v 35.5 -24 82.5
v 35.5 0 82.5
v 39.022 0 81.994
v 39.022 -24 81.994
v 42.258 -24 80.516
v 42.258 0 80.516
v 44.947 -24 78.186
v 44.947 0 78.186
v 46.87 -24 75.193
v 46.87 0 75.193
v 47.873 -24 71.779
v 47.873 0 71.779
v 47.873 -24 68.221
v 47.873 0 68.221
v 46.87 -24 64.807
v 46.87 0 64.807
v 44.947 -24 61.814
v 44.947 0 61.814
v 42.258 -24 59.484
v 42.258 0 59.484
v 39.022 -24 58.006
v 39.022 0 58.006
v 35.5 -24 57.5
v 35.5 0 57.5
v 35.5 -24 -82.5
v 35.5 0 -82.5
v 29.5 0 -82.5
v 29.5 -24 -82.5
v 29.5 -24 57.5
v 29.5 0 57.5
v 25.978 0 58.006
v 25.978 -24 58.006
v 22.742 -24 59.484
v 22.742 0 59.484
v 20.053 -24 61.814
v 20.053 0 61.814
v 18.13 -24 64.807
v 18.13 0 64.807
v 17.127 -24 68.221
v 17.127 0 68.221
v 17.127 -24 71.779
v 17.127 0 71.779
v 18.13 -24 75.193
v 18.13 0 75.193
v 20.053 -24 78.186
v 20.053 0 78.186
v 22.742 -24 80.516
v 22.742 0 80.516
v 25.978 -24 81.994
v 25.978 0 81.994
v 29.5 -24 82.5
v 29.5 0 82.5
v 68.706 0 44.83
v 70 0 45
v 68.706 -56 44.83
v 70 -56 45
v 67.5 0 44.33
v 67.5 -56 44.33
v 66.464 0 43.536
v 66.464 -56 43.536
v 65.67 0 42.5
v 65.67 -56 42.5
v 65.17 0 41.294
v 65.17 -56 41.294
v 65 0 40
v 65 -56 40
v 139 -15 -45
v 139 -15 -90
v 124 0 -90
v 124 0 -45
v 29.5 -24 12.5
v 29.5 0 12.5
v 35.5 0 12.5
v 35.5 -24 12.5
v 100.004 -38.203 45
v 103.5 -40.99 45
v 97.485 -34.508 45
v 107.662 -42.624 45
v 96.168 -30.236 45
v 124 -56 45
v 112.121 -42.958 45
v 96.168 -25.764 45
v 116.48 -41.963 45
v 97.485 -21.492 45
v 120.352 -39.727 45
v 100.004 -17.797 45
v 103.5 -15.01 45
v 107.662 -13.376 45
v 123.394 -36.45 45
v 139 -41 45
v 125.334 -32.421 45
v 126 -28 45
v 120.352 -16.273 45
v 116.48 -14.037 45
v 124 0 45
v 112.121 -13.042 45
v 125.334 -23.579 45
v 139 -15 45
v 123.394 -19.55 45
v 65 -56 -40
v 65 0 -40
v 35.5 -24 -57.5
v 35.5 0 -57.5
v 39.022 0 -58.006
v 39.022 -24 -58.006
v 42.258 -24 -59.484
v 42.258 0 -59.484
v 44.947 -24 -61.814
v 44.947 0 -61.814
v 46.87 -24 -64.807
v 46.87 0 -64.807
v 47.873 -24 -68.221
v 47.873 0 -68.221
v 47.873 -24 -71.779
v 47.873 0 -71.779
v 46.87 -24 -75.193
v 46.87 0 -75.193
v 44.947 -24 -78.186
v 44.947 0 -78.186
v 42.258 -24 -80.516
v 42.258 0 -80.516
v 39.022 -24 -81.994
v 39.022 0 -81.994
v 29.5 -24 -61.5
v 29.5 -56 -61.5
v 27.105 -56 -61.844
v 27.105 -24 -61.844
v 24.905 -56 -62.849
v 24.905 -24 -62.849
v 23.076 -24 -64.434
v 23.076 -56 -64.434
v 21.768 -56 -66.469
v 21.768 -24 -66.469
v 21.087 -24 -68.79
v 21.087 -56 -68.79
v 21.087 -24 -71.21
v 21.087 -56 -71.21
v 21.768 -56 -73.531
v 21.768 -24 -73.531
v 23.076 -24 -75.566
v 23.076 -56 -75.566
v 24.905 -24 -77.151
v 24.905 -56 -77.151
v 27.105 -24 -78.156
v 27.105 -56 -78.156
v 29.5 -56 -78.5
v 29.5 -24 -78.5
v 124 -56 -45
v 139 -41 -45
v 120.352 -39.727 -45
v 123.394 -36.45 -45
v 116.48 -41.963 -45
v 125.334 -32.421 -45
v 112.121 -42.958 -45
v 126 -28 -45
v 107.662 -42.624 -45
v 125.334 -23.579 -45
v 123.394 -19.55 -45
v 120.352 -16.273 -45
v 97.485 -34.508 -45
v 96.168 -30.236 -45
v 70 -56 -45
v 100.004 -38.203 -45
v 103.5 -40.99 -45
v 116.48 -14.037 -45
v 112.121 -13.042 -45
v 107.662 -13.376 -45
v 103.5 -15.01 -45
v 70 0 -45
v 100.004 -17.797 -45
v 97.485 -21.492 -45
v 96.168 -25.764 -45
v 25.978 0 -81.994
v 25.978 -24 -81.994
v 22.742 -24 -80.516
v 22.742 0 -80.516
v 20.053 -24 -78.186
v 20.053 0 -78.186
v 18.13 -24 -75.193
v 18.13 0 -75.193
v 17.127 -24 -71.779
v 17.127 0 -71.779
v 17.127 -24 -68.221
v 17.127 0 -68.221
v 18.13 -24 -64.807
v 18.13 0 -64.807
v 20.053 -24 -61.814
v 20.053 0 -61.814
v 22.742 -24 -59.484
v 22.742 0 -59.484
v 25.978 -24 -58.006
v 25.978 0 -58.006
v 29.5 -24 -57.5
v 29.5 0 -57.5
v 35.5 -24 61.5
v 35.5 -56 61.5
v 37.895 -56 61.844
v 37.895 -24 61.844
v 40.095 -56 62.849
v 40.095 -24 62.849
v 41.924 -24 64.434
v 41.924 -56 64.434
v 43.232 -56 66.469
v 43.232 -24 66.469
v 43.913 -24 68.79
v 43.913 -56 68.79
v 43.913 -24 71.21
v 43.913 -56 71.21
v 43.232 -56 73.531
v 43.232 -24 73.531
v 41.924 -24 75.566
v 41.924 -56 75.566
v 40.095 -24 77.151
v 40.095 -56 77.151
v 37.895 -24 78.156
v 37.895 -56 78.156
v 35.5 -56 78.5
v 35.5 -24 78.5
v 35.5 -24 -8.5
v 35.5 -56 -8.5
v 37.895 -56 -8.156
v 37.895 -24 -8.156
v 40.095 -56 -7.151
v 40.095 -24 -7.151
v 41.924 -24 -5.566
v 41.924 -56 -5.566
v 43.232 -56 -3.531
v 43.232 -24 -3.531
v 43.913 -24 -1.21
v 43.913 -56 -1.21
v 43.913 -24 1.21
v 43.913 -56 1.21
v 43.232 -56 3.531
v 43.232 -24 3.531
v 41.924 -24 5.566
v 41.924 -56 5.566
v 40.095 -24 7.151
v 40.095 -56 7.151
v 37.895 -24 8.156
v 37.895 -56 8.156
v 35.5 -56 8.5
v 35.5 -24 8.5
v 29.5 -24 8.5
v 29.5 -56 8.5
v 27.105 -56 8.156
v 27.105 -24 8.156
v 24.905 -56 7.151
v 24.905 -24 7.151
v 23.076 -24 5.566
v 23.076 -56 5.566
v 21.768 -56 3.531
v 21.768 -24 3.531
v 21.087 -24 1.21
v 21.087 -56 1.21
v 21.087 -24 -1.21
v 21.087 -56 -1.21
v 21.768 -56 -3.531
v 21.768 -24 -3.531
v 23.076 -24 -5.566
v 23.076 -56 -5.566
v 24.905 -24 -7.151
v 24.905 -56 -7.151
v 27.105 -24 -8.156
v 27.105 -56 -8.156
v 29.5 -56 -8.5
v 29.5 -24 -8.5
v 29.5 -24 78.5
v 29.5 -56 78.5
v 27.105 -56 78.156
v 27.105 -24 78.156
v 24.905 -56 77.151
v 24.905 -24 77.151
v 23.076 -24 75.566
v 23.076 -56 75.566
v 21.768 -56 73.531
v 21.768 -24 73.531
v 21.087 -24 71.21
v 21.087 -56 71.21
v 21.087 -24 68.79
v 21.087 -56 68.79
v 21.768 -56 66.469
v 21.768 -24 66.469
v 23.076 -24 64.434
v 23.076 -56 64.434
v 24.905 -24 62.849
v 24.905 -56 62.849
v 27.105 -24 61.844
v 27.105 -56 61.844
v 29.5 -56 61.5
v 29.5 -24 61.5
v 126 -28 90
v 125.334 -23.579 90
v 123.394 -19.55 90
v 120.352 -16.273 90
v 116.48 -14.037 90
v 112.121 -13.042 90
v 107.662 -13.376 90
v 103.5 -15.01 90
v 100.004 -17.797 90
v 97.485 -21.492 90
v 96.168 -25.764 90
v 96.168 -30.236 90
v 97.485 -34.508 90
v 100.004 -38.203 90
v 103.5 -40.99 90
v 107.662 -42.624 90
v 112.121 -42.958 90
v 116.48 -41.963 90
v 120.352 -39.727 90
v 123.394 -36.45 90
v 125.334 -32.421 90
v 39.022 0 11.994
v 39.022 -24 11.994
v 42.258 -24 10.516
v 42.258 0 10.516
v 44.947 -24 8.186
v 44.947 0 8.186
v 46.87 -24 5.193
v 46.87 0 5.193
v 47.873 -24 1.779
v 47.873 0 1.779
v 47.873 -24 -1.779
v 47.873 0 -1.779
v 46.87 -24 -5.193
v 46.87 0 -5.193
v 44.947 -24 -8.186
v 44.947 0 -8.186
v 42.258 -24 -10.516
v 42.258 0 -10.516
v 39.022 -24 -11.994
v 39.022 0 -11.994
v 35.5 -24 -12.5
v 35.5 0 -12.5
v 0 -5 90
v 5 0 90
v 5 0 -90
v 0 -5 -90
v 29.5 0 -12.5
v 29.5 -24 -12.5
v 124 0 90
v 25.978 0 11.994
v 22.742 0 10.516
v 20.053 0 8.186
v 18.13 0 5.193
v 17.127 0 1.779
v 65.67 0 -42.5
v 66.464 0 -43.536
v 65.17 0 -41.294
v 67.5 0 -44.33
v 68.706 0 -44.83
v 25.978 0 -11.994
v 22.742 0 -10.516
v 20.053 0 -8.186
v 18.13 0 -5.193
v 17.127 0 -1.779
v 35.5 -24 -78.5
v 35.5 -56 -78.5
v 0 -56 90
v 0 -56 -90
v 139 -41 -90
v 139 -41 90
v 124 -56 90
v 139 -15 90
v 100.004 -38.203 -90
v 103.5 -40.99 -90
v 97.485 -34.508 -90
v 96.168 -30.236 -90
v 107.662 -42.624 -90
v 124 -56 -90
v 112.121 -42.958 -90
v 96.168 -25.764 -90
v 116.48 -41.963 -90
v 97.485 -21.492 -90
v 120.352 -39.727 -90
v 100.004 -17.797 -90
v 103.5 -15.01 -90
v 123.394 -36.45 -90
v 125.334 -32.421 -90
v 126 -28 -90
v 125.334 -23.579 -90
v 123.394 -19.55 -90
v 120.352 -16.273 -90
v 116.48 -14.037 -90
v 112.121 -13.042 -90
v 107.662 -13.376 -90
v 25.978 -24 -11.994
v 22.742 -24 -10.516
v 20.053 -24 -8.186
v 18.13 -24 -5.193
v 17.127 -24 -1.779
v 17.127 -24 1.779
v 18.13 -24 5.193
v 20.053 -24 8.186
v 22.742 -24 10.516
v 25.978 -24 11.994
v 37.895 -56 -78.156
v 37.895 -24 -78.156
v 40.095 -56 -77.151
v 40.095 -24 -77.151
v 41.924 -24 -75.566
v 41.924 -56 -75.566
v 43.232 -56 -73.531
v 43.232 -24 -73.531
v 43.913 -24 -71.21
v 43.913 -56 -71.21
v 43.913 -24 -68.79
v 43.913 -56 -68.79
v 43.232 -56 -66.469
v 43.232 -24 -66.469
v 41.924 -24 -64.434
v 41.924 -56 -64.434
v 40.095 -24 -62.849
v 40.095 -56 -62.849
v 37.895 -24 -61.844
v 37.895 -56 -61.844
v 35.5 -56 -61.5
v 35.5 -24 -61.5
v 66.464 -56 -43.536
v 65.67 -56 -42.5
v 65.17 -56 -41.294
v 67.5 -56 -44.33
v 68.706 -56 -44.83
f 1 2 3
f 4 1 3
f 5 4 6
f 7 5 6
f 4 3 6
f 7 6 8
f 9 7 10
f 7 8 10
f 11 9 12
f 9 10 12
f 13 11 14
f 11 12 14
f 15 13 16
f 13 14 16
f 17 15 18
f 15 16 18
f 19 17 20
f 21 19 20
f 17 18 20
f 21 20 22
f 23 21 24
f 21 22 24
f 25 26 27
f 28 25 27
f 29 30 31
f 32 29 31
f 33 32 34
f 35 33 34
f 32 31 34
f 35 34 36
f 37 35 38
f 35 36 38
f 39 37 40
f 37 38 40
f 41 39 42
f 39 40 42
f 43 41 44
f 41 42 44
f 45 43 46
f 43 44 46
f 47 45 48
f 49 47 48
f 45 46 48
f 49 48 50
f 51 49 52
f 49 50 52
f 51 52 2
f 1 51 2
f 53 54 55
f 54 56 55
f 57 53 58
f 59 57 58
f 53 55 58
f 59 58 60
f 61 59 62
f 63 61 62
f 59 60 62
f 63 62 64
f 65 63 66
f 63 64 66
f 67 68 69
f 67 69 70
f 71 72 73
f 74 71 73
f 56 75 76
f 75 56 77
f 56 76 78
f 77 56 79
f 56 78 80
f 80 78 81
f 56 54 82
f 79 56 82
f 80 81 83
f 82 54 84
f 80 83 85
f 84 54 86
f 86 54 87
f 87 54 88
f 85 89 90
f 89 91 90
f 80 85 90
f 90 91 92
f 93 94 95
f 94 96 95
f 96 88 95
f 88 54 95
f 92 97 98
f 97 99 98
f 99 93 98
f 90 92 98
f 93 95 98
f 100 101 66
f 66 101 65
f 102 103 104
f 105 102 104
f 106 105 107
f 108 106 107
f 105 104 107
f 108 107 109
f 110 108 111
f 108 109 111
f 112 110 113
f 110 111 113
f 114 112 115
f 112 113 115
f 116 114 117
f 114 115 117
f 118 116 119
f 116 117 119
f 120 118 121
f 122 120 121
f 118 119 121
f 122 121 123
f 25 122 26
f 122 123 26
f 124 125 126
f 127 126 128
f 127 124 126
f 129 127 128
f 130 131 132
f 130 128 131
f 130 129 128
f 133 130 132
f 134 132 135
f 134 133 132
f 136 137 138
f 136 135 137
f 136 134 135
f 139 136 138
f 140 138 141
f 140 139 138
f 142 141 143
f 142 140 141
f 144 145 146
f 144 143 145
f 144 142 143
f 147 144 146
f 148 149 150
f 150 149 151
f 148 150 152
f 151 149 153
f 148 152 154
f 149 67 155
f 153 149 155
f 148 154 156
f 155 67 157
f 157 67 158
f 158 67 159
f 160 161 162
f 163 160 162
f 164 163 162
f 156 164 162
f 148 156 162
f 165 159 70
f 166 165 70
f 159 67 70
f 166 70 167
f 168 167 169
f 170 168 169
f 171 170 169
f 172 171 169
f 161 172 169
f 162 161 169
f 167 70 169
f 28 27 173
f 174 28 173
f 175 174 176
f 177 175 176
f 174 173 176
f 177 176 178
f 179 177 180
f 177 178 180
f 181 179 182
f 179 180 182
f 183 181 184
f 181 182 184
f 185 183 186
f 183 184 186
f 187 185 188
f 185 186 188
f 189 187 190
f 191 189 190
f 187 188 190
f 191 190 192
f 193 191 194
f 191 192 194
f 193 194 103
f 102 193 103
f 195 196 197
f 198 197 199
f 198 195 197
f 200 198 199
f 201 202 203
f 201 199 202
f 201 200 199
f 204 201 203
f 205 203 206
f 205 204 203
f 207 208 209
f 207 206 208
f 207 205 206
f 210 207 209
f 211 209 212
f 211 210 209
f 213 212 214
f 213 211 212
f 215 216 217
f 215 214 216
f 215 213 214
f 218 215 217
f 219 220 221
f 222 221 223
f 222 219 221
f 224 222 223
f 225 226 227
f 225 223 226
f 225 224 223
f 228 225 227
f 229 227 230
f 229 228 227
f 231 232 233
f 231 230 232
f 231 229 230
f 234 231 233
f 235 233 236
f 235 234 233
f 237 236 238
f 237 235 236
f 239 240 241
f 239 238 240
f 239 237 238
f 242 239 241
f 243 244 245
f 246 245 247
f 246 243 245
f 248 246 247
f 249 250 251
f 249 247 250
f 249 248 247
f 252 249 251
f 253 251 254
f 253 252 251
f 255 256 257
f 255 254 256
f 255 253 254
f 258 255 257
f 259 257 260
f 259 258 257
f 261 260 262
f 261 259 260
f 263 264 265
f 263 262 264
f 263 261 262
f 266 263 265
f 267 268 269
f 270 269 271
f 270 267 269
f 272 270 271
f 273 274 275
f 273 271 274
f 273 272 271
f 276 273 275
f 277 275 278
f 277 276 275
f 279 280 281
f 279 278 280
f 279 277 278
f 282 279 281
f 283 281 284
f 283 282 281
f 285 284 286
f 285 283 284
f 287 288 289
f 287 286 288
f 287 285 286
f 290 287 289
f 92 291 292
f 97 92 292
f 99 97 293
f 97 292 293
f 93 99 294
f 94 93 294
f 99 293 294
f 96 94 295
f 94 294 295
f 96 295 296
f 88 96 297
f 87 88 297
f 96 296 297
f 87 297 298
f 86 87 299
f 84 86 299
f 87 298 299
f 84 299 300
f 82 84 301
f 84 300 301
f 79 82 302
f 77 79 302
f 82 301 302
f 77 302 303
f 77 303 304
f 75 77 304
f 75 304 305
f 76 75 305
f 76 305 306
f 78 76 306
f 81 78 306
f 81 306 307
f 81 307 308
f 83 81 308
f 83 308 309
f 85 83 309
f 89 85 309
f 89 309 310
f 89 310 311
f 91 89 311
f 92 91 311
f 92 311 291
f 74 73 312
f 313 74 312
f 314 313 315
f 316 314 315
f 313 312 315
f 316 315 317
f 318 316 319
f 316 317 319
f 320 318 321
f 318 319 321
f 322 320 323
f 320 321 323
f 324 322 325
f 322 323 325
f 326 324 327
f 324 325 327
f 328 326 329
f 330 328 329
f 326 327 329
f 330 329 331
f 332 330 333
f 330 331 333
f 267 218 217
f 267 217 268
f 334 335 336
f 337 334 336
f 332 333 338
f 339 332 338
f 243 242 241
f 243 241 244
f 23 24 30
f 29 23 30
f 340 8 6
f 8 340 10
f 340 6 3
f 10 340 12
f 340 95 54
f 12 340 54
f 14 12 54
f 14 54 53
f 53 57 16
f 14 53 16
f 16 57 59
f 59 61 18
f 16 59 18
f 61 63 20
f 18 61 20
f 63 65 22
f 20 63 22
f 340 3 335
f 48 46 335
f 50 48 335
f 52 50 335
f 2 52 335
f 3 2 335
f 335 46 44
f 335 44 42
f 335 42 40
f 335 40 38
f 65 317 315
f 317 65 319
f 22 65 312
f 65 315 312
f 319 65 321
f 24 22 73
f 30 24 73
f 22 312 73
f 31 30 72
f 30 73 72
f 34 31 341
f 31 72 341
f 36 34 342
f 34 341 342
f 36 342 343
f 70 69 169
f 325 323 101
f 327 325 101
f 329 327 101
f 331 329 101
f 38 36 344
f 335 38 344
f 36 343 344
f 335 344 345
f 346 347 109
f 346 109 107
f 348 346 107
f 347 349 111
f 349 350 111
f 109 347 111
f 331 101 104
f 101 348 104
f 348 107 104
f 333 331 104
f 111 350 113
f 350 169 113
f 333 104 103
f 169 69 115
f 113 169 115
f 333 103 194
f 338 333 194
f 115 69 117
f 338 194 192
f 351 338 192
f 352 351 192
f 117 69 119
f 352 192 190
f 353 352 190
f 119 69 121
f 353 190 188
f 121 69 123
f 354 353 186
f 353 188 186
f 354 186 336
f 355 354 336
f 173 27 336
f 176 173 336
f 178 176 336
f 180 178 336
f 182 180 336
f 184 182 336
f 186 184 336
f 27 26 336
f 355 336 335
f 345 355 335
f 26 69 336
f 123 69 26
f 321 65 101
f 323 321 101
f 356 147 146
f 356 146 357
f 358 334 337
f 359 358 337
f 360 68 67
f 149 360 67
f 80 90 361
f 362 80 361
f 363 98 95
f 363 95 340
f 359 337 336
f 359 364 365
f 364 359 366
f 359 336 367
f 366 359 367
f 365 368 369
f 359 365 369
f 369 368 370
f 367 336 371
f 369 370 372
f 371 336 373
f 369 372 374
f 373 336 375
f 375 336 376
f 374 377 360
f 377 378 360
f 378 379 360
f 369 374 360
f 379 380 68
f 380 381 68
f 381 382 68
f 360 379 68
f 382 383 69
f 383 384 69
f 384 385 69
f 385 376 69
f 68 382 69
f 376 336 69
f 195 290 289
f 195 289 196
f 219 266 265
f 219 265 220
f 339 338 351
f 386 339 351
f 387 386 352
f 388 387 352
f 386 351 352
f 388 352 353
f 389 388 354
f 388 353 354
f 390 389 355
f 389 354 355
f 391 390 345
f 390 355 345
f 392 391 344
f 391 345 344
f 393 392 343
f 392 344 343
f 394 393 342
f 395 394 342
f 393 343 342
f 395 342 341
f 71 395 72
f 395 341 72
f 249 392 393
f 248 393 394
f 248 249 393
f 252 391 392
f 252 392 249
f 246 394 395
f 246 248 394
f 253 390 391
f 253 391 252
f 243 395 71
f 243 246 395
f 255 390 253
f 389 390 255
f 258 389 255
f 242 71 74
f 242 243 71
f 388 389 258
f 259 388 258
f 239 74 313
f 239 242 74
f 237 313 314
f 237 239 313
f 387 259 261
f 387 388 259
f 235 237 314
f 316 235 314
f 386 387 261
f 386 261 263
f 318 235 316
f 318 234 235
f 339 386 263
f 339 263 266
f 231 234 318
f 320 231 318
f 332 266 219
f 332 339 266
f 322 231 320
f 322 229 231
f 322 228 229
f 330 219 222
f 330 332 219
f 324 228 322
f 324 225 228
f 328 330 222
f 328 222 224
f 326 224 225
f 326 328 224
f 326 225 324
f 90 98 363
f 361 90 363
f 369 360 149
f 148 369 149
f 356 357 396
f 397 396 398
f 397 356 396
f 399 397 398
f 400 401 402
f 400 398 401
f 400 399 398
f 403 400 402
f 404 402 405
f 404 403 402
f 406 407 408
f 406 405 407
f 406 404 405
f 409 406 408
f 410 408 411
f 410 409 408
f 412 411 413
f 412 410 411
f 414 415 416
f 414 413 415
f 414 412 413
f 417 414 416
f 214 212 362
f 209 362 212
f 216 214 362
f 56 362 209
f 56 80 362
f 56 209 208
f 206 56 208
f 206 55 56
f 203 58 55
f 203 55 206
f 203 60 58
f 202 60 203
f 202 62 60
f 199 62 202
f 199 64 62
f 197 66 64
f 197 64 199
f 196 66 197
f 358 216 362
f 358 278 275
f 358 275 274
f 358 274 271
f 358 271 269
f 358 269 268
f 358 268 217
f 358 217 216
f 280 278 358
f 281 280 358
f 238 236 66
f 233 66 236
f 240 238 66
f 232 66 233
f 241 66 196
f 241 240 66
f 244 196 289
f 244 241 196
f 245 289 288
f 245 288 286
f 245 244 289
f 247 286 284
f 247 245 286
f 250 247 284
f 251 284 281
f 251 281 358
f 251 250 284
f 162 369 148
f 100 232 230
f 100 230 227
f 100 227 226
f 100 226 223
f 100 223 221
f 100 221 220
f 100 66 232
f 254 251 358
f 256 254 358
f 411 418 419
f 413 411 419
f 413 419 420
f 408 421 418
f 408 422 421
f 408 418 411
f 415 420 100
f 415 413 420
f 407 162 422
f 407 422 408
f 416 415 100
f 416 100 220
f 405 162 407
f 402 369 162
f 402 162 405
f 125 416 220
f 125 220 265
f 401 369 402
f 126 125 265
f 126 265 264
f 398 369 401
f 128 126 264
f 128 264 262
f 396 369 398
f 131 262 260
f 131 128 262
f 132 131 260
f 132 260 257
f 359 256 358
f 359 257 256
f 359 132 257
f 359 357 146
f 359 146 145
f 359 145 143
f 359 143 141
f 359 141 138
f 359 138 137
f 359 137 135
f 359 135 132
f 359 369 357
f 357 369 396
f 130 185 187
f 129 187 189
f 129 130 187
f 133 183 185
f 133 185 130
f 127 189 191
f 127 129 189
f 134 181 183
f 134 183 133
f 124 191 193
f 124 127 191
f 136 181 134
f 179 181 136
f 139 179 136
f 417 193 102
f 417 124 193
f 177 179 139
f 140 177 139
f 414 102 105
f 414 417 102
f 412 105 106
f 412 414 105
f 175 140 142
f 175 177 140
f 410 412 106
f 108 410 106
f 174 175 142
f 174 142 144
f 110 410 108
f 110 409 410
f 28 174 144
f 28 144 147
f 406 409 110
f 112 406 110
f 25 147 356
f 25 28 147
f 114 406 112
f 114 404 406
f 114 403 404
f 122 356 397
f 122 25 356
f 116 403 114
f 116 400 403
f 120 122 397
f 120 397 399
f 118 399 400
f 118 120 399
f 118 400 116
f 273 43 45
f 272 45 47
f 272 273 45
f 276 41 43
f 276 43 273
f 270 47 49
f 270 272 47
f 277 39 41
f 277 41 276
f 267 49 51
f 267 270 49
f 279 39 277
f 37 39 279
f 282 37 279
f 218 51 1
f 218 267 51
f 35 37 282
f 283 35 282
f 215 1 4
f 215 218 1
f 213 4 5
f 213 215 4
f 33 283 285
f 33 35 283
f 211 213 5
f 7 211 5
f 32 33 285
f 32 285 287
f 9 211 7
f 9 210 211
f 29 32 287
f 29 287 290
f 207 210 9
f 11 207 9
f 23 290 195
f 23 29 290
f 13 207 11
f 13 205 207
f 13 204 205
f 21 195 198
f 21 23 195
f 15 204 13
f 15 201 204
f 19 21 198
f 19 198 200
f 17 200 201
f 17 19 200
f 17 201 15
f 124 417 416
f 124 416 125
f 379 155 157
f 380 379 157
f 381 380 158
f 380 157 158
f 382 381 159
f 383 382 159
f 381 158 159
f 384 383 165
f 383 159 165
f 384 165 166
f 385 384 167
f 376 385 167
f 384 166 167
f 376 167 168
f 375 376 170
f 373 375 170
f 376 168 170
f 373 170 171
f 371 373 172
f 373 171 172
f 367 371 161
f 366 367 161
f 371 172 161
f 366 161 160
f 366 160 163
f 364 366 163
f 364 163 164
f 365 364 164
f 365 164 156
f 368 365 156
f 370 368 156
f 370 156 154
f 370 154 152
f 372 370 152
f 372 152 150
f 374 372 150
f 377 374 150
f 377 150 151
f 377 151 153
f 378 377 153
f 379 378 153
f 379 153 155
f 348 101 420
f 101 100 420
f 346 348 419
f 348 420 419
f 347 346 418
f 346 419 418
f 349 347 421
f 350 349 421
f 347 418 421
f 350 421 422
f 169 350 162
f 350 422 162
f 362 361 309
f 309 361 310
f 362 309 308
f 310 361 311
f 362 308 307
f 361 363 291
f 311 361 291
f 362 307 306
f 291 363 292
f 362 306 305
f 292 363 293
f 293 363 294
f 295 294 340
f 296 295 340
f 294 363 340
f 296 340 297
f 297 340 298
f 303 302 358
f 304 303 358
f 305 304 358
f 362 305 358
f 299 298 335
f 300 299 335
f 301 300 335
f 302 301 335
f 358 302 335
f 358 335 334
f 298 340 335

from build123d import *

# Parameters (mm, degrees)
EXTRUDE_1_DEPTH        = 56
CUT_EXTRUDE_1_REACH    = 176.806
CUT_EXTRUDE_2_DEPTH    = 24
PATTERN_LINEAR_1_COUNT = 3
PATTERN_LINEAR_1_PITCH = 70
SKETCH_4_R             = 15
CUT_EXTRUDE_3_DEPTH    = 235.215712539
CHAMFER_1_SIZE         = 5
CHAMFER_2_SIZE         = 15
FILLET_1_R             = 5


with BuildPart() as part:
    # 草图1 → 凸台-拉伸1 (new body)
    with BuildSketch(Plane(origin=(0, 0, 0), x_dir=(1, 0, 0), z_dir=(0, 1, 0))):
        Polygon((0, -90), (0, 90), (139, 90), (139, 45), (65, 45), (65, -45), (139, -45), (139, -90), align=None)
    extrude(amount=-EXTRUDE_1_DEPTH)

    # 草图2 → 切除-拉伸1 (cut, up to next)
    with BuildSketch(Plane(origin=(0, 0, 0), x_dir=(1, 0, 0), z_dir=(0, 1, 0)), mode=Mode.PRIVATE) as cut_extrude_1_sk1:
        with BuildLine():
            Line((29.5, 78.5), (35.5, 78.5))
            ThreePointArc((35.5, 78.5), (44, 70), (35.5, 61.5))
            Line((35.5, 61.5), (29.5, 61.5))
            ThreePointArc((29.5, 61.5), (21, 70), (29.5, 78.5))
        make_face()
    cut_extrude_1_tool1 = extrude(cut_extrude_1_sk1.sketch, amount=-CUT_EXTRUDE_1_REACH, mode=Mode.PRIVATE) & part.part
    cut_extrude_1 = cut_extrude_1_tool1.solids().sort_by_distance((32.5, 0, -70))[0]
    add(cut_extrude_1, mode=Mode.SUBTRACT)

    # 草图3 → 切除-拉伸2 (cut)
    with BuildSketch(Plane(origin=(0, 0, 0), x_dir=(1, 0, 0), z_dir=(0, 1, 0))):
        with BuildLine():
            Line((29.5, 57.5), (35.5, 57.5))
            ThreePointArc((35.5, 57.5), (48, 70), (35.5, 82.5))
            Line((35.5, 82.5), (29.5, 82.5))
            ThreePointArc((29.5, 82.5), (17, 70), (29.5, 57.5))
        make_face()
    cut_extrude_2 = extrude(amount=-CUT_EXTRUDE_2_DEPTH, mode=Mode.SUBTRACT)

    # 阵列(线性)1: 切除-拉伸1, 切除-拉伸2 ×3
    with Locations(*[(0, 0, i * PATTERN_LINEAR_1_PITCH) for i in range(1, PATTERN_LINEAR_1_COUNT)]):
        add(cut_extrude_1, mode=Mode.SUBTRACT)
        add(cut_extrude_2, mode=Mode.SUBTRACT)

    # 草图4 → 切除-拉伸3 (cut, through all)
    with BuildSketch(Plane.XY.offset(90)):
        with Locations((111, -28)):
            Circle(SKETCH_4_R)
    extrude(amount=-CUT_EXTRUDE_3_DEPTH, mode=Mode.SUBTRACT)

    # 倒角1
    chamfer_1_edges = [part.edges().sort_by_distance(p)[0] for p in [
        (0, 0, 0),
    ]]
    chamfer(chamfer_1_edges, length=CHAMFER_1_SIZE)

    # 倒角2
    chamfer_2_edges = [part.edges().sort_by_distance(p)[0] for p in [
        (139, -56, 67.5),
        (139, -56, -67.5),
        (139, 0, -67.5),
        (139, 0, 67.5),
    ]]
    chamfer(chamfer_2_edges, length=CHAMFER_2_SIZE)

    # 圆角1
    fillet_1_edges = [part.edges().sort_by_distance(p)[0] for p in [
        (65, -28, -45),
        (65, -28, 45),
    ]]
    fillet(fillet_1_edges, radius=FILLET_1_R)


solid = part.part
